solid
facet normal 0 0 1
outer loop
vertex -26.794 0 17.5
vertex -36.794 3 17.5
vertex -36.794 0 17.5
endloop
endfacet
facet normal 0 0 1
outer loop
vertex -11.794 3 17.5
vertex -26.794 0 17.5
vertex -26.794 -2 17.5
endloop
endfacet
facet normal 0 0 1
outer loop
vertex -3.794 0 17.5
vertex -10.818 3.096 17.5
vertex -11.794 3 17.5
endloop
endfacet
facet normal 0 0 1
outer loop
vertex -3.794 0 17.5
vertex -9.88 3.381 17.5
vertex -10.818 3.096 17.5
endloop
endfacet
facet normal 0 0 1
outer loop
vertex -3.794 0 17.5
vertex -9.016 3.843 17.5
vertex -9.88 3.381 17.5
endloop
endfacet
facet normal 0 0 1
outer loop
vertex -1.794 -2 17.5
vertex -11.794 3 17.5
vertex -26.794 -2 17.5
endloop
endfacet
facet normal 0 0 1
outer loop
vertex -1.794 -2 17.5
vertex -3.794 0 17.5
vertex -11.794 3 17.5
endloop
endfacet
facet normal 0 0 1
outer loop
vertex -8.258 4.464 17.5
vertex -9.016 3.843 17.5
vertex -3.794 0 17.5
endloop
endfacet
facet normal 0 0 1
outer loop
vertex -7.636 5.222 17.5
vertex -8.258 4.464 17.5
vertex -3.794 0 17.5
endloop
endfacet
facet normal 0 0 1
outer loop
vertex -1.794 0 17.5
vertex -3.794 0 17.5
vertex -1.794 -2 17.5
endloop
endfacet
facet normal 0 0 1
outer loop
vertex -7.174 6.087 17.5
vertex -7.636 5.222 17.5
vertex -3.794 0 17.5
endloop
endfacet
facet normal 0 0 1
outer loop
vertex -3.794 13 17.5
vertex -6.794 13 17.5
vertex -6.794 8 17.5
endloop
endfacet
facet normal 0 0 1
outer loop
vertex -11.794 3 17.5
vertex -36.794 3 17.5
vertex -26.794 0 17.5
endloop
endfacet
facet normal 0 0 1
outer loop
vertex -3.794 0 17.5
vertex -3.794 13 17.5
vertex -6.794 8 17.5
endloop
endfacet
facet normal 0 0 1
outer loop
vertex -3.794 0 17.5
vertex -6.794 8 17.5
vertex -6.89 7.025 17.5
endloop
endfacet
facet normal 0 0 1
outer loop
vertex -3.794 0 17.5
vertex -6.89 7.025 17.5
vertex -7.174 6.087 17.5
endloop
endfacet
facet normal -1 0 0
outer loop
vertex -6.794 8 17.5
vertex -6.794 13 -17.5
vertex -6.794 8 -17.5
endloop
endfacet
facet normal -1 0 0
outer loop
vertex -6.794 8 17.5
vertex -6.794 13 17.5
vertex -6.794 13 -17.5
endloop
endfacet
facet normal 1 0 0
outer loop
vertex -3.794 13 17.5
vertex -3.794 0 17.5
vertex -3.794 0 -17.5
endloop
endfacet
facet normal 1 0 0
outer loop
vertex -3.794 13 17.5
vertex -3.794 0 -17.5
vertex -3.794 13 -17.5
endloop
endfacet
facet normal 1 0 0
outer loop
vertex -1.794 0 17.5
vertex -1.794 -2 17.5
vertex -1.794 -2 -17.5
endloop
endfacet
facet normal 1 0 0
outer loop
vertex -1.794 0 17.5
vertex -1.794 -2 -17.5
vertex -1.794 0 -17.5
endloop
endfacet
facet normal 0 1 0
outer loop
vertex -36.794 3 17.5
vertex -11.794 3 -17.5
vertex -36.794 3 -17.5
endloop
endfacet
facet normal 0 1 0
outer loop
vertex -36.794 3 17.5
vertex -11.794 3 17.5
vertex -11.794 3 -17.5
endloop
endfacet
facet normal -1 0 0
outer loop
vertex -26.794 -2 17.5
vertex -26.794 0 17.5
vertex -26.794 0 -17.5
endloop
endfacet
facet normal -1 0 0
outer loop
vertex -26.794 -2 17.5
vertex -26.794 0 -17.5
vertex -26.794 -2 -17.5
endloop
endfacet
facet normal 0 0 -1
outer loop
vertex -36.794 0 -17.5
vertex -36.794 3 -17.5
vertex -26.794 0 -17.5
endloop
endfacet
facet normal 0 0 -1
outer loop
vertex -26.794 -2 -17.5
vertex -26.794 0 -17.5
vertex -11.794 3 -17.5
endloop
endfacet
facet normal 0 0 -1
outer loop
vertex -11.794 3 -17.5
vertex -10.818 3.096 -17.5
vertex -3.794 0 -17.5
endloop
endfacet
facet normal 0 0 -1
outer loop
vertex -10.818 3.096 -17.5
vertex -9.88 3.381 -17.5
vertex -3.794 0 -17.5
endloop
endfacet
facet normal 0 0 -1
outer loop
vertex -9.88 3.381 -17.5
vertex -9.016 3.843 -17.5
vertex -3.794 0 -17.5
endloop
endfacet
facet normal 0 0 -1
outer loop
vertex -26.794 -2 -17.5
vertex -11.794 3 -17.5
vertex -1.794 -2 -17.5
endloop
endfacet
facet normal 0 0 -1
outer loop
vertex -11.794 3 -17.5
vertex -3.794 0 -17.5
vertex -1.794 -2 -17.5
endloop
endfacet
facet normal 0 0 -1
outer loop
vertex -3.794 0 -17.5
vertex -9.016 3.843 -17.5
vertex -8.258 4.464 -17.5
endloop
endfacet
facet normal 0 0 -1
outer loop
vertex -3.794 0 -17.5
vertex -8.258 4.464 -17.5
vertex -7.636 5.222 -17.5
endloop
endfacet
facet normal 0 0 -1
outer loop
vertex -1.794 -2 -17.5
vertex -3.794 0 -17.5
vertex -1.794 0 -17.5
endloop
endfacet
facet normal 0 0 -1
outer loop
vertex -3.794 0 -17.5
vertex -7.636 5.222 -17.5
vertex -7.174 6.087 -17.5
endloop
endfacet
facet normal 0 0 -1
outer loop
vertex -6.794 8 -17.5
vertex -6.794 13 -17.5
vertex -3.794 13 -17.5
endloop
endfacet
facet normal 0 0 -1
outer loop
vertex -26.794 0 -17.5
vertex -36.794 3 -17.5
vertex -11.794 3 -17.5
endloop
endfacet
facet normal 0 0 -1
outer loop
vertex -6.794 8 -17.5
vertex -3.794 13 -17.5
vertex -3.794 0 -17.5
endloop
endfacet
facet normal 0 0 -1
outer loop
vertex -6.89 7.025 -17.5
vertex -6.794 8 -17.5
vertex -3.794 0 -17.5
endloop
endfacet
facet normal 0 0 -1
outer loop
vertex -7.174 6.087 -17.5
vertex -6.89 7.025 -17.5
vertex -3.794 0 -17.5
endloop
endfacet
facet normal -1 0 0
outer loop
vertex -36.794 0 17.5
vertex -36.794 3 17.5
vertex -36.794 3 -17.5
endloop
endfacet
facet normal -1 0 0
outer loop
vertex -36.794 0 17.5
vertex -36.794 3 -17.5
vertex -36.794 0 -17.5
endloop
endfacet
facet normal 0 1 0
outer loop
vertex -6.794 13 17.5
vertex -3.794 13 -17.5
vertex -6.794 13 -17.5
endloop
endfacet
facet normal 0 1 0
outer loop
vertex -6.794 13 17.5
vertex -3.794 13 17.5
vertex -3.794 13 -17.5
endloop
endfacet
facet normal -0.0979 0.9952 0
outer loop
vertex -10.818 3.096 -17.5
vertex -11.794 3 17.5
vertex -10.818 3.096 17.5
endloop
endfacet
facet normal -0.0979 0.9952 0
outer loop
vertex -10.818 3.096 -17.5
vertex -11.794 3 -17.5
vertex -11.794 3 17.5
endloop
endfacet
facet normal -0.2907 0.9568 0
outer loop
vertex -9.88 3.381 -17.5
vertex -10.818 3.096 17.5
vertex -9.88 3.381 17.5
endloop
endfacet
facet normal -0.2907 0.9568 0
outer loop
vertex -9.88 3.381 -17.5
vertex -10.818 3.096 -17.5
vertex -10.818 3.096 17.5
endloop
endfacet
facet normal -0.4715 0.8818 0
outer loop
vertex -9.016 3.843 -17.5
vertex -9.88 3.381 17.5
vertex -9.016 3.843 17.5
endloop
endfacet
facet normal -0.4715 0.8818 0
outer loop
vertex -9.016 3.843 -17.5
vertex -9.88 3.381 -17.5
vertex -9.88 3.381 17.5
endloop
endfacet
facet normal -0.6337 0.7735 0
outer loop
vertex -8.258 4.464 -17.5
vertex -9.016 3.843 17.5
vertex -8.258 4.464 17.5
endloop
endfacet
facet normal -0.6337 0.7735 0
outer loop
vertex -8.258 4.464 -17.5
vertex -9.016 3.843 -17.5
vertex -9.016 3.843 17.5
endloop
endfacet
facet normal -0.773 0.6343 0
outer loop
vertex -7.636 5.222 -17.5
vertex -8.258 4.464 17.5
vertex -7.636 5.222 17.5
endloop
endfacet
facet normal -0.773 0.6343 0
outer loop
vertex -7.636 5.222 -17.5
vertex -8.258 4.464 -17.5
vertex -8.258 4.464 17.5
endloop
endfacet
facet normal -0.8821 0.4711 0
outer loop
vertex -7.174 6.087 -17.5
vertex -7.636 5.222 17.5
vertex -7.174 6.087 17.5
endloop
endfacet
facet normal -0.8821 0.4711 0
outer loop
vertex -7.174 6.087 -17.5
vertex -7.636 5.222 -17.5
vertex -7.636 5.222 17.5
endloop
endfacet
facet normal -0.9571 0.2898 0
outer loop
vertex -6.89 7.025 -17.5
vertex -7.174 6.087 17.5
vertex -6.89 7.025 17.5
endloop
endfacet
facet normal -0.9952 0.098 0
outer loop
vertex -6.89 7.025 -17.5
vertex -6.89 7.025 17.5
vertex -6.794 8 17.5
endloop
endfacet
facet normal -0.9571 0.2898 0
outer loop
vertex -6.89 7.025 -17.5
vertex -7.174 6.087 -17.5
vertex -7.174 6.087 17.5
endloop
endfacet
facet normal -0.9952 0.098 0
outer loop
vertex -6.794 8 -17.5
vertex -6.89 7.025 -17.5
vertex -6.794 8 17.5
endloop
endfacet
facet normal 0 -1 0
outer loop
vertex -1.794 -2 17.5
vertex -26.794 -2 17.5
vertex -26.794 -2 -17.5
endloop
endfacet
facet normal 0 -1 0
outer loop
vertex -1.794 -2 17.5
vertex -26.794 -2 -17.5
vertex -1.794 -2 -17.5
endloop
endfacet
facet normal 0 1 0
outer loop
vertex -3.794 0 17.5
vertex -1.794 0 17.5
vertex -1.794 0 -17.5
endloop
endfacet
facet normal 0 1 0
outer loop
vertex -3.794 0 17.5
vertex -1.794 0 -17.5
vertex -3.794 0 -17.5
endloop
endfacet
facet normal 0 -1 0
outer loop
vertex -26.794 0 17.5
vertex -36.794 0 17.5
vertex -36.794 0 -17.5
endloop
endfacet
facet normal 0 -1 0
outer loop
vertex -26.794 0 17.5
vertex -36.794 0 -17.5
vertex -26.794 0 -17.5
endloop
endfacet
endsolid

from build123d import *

# Parameters (mm, degrees)
F1_DEPTH = 17.5
F2_R     = 5


with BuildPart() as f1:
    # F0 (on Top) → F1 (new body, symmetric)
    with BuildSketch(Plane.XY):
        Polygon((-6.7937952719, 3), (-36.7937952719, 3), (-36.7937952719, 0), (-26.7937952719, 0), (-26.7937952719, -2), (-3.7937952719, -2), (-1.7937952719, -2), (-1.7937952719, 0), (-3.7937952719, 0), (-3.7937952719, 13), (-6.7937952719, 13), align=None)
    extrude(amount=F1_DEPTH, both=True)

    # F2
    f2_edges = [f1.edges().sort_by_distance(p)[0] for p in [
        (-6.793795, 3, 0),
    ]]
    fillet(f2_edges, radius=F2_R)


solid = f1.part
